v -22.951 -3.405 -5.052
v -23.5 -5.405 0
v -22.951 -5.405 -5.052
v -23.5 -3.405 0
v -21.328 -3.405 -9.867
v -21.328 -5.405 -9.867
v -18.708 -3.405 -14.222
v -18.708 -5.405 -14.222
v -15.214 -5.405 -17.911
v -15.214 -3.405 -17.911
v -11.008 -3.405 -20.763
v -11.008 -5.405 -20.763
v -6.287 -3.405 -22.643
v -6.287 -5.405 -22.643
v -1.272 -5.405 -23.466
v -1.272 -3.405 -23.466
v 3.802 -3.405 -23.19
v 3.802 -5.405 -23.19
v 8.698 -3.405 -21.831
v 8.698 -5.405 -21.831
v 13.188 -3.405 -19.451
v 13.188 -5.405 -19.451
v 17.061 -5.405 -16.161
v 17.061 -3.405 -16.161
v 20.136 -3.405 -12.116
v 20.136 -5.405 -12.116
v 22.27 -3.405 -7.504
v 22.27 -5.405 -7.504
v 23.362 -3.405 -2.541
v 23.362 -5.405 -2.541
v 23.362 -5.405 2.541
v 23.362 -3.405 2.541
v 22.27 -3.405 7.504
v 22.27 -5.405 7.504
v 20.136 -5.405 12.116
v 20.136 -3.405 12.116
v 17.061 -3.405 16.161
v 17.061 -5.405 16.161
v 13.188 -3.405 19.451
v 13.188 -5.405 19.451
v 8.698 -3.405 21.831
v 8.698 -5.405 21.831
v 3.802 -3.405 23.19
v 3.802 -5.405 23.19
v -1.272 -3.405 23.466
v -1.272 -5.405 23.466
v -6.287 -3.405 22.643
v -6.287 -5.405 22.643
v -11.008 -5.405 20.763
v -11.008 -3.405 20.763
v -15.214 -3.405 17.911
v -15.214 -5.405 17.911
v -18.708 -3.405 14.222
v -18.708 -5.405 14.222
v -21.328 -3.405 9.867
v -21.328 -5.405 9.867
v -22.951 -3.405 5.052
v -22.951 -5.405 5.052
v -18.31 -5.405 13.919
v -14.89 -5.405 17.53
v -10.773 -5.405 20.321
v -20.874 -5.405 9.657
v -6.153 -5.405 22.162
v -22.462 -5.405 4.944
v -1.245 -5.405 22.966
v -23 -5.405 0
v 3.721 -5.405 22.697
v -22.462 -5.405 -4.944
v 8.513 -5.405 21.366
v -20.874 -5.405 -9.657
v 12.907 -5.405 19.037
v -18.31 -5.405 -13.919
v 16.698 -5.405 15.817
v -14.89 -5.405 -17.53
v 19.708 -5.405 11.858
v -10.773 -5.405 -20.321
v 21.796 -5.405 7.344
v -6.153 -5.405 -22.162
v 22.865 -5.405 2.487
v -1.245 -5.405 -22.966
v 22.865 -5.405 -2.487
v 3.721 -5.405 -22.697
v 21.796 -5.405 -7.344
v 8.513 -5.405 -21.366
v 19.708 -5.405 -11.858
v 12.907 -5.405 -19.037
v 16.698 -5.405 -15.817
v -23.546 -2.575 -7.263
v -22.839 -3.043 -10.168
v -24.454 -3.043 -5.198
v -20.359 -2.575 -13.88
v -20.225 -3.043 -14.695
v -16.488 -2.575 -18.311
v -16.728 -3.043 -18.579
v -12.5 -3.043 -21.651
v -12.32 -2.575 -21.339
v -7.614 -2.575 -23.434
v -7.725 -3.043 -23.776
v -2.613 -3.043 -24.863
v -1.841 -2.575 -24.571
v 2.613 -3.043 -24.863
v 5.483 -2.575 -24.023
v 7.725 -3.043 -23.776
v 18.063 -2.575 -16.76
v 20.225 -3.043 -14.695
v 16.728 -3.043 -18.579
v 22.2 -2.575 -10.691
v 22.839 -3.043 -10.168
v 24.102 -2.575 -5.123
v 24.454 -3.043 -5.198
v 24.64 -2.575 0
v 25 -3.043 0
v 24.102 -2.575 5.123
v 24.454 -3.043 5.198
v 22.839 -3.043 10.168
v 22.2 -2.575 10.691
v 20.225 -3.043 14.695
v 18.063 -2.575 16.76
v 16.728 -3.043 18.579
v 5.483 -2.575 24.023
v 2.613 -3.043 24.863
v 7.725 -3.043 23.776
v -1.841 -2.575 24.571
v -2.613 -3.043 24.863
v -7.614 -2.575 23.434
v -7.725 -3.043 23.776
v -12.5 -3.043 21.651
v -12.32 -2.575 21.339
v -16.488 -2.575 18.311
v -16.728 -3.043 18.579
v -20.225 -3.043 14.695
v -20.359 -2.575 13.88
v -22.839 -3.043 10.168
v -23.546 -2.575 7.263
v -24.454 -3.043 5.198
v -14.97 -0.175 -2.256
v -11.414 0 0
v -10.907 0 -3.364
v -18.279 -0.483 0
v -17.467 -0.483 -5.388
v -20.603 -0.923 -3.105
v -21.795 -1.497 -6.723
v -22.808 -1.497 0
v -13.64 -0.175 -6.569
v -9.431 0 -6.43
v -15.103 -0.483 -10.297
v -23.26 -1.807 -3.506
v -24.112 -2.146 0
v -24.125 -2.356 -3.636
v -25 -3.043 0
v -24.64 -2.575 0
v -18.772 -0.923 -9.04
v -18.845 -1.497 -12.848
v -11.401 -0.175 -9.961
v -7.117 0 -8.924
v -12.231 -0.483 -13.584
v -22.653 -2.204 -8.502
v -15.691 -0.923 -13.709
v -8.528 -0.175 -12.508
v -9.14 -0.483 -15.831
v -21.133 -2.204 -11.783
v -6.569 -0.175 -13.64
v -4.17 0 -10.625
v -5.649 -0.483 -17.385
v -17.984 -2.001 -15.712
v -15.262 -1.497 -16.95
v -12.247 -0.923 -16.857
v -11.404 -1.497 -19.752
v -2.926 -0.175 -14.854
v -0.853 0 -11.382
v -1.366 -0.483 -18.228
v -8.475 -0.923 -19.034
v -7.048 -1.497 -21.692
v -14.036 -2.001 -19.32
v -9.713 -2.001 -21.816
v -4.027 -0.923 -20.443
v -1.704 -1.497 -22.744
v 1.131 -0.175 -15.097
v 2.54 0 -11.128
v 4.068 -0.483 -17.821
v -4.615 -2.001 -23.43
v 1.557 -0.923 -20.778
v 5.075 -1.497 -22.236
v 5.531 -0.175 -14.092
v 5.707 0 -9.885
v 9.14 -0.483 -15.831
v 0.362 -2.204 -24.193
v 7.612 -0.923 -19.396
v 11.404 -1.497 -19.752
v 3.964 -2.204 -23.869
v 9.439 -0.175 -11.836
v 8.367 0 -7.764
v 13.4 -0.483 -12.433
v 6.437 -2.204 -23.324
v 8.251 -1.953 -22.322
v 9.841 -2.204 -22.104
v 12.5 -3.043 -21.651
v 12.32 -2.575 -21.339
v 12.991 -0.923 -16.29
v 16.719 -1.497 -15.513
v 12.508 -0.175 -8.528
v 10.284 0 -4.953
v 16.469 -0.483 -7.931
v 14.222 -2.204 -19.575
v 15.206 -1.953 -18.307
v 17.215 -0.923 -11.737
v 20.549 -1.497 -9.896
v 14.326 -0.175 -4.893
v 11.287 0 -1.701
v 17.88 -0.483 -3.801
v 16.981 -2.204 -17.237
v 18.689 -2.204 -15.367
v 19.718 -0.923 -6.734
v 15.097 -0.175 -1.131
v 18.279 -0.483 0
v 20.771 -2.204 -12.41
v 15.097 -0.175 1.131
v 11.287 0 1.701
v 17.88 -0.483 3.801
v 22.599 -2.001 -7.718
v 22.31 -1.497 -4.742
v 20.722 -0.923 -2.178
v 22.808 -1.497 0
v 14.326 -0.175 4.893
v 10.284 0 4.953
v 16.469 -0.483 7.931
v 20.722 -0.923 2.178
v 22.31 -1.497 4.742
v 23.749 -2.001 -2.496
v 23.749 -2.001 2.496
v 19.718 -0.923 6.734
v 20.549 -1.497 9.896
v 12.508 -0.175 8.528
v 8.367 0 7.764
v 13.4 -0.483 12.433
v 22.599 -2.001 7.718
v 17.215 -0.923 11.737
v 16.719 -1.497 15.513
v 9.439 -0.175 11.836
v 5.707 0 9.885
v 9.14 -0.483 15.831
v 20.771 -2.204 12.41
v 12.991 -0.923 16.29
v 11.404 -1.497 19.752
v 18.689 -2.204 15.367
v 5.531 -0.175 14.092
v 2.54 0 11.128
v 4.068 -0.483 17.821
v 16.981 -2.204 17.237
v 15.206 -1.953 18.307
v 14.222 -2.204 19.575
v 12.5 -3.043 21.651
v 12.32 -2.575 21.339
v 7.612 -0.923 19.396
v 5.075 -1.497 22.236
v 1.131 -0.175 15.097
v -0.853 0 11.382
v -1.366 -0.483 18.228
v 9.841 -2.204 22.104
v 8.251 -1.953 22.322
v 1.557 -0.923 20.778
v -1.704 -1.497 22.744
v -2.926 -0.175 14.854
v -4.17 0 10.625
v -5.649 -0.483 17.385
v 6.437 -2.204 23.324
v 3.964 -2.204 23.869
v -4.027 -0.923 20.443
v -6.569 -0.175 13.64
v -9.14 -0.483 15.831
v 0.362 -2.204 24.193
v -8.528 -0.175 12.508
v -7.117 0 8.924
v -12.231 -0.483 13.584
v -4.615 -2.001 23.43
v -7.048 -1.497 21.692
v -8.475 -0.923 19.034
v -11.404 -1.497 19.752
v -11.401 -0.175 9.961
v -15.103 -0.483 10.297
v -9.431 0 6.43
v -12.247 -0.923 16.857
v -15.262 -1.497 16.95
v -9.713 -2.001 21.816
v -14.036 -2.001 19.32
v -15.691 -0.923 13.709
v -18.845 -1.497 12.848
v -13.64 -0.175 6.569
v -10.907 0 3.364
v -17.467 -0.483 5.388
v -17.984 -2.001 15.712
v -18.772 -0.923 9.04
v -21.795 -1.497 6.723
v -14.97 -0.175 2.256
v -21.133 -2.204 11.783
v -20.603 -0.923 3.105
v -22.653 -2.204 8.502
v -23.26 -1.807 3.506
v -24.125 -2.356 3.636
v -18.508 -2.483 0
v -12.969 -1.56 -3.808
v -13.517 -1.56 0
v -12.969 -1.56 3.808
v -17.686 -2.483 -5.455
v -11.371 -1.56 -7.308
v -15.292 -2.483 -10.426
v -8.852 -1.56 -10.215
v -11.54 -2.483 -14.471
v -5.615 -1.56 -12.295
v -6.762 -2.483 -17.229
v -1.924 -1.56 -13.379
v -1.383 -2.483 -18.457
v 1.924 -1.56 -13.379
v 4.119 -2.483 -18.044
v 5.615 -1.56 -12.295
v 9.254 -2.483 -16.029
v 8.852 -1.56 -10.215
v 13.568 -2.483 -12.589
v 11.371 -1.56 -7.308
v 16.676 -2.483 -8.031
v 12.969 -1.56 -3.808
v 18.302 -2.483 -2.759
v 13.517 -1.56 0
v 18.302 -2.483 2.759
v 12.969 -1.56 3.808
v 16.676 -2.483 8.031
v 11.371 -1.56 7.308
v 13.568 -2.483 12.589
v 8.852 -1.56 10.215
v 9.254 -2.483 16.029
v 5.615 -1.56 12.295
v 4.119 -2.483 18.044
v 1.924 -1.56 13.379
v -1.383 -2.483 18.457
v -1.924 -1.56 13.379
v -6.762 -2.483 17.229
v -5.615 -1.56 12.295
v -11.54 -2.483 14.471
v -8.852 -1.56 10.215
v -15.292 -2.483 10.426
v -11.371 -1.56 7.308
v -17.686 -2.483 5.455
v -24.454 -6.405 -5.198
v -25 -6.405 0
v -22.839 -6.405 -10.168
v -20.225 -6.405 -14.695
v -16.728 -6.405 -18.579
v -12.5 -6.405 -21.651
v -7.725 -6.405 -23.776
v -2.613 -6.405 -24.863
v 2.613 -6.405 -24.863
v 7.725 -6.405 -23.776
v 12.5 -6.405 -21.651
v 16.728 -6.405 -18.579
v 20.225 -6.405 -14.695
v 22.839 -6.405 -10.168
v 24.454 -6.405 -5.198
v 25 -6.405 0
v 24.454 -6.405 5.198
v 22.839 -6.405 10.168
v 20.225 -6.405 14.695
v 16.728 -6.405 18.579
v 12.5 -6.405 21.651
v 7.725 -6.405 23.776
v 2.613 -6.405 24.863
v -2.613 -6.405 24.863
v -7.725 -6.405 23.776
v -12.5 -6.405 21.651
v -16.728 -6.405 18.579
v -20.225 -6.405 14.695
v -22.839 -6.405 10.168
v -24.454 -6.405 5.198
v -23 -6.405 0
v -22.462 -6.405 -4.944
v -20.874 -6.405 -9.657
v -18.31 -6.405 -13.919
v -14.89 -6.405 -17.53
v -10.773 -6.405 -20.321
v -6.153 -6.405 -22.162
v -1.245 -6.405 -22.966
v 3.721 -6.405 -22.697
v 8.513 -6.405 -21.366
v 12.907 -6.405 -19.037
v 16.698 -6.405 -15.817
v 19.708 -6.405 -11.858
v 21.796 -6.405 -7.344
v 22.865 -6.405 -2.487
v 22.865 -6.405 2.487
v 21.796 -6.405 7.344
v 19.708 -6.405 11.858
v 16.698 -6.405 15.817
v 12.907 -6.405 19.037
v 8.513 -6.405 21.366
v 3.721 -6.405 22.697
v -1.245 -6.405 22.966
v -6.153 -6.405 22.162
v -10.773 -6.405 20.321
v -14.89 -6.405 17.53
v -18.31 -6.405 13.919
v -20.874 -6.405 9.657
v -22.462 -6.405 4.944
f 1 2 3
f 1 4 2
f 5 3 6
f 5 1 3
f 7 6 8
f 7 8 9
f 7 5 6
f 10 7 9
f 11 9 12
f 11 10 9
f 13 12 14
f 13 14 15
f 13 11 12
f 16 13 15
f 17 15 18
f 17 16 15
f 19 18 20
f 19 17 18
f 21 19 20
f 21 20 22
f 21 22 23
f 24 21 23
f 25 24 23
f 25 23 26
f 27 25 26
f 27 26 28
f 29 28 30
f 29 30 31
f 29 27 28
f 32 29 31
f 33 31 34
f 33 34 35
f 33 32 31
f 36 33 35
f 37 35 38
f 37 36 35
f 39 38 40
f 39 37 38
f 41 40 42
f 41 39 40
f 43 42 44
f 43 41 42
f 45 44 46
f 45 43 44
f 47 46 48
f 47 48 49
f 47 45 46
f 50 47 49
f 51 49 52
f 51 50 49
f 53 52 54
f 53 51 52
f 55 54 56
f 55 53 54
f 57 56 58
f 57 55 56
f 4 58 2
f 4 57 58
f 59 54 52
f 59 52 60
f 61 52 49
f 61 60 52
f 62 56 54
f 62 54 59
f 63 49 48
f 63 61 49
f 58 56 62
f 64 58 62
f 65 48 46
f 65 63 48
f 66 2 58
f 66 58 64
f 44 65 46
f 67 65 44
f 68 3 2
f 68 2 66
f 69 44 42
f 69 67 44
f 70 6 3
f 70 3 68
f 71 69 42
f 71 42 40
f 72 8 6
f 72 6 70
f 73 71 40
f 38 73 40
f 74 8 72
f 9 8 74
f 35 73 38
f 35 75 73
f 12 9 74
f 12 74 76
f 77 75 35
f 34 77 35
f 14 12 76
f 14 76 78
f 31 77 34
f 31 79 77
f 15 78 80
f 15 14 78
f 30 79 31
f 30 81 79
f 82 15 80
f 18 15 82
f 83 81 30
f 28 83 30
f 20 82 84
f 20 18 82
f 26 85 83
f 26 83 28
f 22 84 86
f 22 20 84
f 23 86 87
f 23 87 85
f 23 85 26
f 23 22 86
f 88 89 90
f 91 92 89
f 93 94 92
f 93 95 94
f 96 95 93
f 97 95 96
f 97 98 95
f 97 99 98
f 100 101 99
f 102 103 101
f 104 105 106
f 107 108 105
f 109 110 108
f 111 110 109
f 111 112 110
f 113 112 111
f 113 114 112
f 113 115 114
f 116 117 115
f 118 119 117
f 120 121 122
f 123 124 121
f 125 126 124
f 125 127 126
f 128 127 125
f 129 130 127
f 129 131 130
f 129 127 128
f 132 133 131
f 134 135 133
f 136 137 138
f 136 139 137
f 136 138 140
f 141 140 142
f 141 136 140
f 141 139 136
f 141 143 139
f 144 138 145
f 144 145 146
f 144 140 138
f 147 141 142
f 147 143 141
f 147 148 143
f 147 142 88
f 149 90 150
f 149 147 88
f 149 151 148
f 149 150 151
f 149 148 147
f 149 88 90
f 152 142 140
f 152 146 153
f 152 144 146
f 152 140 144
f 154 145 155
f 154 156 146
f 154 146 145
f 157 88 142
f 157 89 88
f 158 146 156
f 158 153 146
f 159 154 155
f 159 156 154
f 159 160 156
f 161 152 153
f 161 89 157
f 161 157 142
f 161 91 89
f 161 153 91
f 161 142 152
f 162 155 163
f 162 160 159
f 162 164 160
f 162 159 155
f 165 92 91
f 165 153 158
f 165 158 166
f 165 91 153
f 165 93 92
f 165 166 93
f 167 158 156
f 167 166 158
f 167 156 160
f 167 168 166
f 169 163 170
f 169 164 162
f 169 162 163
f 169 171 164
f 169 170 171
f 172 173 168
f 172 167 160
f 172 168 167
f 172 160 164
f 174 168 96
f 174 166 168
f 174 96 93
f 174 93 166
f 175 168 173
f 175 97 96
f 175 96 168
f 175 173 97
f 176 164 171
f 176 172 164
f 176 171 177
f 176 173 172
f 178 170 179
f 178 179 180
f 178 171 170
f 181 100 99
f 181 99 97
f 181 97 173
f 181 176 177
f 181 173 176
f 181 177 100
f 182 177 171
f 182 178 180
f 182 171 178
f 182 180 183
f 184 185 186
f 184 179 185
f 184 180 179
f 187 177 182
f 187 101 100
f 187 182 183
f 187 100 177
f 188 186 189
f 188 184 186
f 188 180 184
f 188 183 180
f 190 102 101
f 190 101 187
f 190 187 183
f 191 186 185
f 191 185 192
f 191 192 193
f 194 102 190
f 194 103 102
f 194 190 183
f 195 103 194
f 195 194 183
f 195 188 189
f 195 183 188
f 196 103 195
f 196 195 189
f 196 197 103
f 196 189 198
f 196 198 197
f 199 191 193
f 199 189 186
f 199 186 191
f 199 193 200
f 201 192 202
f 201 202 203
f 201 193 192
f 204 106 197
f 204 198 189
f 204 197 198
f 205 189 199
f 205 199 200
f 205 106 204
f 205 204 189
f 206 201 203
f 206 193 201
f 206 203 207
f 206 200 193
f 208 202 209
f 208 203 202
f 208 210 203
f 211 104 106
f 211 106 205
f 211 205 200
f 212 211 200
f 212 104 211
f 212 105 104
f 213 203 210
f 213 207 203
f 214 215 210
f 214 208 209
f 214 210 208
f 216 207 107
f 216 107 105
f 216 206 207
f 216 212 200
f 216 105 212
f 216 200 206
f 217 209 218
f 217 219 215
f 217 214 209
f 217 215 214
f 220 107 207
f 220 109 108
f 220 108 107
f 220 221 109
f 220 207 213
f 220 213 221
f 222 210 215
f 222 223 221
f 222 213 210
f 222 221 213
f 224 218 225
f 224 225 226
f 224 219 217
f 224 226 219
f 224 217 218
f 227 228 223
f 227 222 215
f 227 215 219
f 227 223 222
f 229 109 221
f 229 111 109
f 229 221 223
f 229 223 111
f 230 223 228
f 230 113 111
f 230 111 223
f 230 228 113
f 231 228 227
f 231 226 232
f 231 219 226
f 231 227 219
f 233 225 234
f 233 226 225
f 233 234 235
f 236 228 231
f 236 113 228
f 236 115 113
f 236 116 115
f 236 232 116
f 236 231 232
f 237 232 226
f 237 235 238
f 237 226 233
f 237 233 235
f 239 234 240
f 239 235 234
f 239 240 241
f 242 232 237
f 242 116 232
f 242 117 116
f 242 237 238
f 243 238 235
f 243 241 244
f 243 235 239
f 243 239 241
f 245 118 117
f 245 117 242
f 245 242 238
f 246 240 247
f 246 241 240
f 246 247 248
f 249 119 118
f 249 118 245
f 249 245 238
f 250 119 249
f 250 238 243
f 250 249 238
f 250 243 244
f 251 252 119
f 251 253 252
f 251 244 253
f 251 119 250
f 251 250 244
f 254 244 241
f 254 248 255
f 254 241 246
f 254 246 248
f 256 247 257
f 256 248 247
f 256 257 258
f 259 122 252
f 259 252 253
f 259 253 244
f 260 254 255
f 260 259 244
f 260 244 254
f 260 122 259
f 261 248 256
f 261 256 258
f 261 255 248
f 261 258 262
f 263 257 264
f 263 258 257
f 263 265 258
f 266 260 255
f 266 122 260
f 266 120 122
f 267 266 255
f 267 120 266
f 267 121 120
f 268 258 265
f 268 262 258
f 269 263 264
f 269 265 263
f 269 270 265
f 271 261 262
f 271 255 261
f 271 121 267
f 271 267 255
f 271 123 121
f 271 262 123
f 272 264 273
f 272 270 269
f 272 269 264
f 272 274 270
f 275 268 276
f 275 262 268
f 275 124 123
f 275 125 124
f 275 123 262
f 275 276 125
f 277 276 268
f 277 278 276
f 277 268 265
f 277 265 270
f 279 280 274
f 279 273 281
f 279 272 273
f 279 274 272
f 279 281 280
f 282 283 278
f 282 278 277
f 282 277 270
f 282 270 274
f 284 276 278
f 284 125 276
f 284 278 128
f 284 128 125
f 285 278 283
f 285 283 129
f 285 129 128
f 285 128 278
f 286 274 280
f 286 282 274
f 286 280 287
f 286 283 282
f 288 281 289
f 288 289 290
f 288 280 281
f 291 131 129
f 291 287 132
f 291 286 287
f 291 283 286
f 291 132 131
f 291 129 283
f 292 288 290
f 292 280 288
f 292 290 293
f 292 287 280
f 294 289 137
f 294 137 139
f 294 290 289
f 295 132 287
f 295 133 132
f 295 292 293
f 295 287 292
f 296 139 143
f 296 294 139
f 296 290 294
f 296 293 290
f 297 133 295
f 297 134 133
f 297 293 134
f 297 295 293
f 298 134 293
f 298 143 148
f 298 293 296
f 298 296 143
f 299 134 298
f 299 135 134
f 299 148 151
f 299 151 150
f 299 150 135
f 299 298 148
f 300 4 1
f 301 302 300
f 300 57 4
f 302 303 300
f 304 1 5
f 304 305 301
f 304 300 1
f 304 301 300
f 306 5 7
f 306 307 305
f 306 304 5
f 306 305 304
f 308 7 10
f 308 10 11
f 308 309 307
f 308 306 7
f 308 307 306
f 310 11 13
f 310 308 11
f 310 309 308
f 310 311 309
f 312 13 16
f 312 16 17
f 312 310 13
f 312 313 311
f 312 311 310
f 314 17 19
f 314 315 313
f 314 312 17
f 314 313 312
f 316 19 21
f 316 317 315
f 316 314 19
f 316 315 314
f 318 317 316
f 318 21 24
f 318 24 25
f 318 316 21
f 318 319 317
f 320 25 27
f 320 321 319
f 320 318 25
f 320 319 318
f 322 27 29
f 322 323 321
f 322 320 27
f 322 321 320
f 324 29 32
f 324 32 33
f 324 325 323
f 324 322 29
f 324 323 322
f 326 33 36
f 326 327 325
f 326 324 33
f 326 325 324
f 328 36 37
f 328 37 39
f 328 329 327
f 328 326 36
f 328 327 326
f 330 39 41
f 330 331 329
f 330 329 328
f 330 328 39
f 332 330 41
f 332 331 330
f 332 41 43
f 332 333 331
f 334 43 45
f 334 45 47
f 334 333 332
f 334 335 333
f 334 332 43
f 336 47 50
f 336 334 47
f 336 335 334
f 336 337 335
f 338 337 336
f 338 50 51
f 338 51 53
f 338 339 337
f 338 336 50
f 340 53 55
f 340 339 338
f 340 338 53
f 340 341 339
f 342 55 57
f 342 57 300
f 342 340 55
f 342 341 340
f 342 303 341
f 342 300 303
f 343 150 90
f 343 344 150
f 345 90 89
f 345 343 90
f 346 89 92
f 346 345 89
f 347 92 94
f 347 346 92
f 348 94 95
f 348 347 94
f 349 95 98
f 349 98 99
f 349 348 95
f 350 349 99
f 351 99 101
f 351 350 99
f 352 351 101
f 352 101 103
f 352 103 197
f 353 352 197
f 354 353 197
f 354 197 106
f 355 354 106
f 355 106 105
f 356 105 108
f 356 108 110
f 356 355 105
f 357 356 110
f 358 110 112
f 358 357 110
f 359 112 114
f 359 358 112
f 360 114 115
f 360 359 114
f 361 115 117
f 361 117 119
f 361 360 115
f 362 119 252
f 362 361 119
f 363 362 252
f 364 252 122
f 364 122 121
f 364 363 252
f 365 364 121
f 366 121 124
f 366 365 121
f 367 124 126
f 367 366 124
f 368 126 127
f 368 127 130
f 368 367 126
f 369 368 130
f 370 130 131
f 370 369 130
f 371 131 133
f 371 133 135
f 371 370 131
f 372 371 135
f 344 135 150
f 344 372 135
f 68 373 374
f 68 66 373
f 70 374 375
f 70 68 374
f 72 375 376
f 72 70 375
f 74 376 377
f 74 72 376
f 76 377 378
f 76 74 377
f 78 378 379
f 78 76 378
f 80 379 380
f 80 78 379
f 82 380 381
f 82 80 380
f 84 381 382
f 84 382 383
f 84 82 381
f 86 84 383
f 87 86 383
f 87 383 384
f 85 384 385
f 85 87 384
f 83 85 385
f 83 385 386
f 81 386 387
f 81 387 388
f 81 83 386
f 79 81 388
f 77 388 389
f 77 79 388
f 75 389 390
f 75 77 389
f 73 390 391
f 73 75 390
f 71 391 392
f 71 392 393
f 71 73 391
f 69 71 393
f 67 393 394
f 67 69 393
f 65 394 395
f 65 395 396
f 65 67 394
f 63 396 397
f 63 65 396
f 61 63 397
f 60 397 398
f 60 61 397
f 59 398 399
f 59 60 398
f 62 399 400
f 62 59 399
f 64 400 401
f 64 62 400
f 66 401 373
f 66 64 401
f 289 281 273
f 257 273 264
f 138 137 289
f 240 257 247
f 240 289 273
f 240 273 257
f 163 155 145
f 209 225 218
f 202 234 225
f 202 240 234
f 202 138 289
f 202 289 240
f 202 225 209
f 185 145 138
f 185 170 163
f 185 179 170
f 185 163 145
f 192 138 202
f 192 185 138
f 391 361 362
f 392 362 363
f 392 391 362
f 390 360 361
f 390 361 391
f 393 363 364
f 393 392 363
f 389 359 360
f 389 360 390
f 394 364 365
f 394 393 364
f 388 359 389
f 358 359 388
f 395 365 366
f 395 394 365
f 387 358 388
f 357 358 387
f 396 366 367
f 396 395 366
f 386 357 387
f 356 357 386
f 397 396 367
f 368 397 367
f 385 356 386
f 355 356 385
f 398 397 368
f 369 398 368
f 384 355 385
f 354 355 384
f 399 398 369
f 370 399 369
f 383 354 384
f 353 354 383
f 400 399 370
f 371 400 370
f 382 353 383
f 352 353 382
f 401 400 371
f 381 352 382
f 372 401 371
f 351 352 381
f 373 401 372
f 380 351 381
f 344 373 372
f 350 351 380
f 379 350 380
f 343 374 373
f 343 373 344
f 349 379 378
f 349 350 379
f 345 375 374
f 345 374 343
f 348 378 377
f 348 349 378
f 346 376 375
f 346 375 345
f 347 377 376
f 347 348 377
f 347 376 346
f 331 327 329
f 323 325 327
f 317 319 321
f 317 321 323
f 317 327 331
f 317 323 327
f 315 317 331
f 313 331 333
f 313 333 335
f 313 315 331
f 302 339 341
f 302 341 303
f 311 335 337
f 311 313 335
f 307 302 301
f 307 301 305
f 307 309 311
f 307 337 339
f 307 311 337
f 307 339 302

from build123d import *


with BuildPart() as part:
    # Esquisse1 → Révolution1 (revolve)
    with BuildSketch(Plane.XY):
        with BuildLine():
            Line((0, 0), (-11.414353025, 0))
            add(Edge.make_bspline(
                [(-11.414353025, 0), (-23.4645195, -0.324875606), (-25, -3.043224693)],
                knots=[0, 0, 0, 1, 1, 1], degree=2))
            Line((-25, -3.043224693), (-25, -6.405018167))
            Line((-25, -6.405018167), (-23, -6.405018167))
            Line((-23, -6.405018167), (-23, -5.405018167))
            Line((-23, -5.405018167), (-23.5, -5.405018167))
            Line((-23.5, -5.405018167), (-23.5, -3.405018167))
            Line((-23.5, -3.405018167), (-13.516966398, -1.56006451))
            Line((-13.516966398, -1.56006451), (0, -1.56006451))
            Line((0, -1.56006451), (0, 0))
        make_face()
    revolve(axis=Axis((0, 0, 0), (0, -1, 0)))


solid = part.part
